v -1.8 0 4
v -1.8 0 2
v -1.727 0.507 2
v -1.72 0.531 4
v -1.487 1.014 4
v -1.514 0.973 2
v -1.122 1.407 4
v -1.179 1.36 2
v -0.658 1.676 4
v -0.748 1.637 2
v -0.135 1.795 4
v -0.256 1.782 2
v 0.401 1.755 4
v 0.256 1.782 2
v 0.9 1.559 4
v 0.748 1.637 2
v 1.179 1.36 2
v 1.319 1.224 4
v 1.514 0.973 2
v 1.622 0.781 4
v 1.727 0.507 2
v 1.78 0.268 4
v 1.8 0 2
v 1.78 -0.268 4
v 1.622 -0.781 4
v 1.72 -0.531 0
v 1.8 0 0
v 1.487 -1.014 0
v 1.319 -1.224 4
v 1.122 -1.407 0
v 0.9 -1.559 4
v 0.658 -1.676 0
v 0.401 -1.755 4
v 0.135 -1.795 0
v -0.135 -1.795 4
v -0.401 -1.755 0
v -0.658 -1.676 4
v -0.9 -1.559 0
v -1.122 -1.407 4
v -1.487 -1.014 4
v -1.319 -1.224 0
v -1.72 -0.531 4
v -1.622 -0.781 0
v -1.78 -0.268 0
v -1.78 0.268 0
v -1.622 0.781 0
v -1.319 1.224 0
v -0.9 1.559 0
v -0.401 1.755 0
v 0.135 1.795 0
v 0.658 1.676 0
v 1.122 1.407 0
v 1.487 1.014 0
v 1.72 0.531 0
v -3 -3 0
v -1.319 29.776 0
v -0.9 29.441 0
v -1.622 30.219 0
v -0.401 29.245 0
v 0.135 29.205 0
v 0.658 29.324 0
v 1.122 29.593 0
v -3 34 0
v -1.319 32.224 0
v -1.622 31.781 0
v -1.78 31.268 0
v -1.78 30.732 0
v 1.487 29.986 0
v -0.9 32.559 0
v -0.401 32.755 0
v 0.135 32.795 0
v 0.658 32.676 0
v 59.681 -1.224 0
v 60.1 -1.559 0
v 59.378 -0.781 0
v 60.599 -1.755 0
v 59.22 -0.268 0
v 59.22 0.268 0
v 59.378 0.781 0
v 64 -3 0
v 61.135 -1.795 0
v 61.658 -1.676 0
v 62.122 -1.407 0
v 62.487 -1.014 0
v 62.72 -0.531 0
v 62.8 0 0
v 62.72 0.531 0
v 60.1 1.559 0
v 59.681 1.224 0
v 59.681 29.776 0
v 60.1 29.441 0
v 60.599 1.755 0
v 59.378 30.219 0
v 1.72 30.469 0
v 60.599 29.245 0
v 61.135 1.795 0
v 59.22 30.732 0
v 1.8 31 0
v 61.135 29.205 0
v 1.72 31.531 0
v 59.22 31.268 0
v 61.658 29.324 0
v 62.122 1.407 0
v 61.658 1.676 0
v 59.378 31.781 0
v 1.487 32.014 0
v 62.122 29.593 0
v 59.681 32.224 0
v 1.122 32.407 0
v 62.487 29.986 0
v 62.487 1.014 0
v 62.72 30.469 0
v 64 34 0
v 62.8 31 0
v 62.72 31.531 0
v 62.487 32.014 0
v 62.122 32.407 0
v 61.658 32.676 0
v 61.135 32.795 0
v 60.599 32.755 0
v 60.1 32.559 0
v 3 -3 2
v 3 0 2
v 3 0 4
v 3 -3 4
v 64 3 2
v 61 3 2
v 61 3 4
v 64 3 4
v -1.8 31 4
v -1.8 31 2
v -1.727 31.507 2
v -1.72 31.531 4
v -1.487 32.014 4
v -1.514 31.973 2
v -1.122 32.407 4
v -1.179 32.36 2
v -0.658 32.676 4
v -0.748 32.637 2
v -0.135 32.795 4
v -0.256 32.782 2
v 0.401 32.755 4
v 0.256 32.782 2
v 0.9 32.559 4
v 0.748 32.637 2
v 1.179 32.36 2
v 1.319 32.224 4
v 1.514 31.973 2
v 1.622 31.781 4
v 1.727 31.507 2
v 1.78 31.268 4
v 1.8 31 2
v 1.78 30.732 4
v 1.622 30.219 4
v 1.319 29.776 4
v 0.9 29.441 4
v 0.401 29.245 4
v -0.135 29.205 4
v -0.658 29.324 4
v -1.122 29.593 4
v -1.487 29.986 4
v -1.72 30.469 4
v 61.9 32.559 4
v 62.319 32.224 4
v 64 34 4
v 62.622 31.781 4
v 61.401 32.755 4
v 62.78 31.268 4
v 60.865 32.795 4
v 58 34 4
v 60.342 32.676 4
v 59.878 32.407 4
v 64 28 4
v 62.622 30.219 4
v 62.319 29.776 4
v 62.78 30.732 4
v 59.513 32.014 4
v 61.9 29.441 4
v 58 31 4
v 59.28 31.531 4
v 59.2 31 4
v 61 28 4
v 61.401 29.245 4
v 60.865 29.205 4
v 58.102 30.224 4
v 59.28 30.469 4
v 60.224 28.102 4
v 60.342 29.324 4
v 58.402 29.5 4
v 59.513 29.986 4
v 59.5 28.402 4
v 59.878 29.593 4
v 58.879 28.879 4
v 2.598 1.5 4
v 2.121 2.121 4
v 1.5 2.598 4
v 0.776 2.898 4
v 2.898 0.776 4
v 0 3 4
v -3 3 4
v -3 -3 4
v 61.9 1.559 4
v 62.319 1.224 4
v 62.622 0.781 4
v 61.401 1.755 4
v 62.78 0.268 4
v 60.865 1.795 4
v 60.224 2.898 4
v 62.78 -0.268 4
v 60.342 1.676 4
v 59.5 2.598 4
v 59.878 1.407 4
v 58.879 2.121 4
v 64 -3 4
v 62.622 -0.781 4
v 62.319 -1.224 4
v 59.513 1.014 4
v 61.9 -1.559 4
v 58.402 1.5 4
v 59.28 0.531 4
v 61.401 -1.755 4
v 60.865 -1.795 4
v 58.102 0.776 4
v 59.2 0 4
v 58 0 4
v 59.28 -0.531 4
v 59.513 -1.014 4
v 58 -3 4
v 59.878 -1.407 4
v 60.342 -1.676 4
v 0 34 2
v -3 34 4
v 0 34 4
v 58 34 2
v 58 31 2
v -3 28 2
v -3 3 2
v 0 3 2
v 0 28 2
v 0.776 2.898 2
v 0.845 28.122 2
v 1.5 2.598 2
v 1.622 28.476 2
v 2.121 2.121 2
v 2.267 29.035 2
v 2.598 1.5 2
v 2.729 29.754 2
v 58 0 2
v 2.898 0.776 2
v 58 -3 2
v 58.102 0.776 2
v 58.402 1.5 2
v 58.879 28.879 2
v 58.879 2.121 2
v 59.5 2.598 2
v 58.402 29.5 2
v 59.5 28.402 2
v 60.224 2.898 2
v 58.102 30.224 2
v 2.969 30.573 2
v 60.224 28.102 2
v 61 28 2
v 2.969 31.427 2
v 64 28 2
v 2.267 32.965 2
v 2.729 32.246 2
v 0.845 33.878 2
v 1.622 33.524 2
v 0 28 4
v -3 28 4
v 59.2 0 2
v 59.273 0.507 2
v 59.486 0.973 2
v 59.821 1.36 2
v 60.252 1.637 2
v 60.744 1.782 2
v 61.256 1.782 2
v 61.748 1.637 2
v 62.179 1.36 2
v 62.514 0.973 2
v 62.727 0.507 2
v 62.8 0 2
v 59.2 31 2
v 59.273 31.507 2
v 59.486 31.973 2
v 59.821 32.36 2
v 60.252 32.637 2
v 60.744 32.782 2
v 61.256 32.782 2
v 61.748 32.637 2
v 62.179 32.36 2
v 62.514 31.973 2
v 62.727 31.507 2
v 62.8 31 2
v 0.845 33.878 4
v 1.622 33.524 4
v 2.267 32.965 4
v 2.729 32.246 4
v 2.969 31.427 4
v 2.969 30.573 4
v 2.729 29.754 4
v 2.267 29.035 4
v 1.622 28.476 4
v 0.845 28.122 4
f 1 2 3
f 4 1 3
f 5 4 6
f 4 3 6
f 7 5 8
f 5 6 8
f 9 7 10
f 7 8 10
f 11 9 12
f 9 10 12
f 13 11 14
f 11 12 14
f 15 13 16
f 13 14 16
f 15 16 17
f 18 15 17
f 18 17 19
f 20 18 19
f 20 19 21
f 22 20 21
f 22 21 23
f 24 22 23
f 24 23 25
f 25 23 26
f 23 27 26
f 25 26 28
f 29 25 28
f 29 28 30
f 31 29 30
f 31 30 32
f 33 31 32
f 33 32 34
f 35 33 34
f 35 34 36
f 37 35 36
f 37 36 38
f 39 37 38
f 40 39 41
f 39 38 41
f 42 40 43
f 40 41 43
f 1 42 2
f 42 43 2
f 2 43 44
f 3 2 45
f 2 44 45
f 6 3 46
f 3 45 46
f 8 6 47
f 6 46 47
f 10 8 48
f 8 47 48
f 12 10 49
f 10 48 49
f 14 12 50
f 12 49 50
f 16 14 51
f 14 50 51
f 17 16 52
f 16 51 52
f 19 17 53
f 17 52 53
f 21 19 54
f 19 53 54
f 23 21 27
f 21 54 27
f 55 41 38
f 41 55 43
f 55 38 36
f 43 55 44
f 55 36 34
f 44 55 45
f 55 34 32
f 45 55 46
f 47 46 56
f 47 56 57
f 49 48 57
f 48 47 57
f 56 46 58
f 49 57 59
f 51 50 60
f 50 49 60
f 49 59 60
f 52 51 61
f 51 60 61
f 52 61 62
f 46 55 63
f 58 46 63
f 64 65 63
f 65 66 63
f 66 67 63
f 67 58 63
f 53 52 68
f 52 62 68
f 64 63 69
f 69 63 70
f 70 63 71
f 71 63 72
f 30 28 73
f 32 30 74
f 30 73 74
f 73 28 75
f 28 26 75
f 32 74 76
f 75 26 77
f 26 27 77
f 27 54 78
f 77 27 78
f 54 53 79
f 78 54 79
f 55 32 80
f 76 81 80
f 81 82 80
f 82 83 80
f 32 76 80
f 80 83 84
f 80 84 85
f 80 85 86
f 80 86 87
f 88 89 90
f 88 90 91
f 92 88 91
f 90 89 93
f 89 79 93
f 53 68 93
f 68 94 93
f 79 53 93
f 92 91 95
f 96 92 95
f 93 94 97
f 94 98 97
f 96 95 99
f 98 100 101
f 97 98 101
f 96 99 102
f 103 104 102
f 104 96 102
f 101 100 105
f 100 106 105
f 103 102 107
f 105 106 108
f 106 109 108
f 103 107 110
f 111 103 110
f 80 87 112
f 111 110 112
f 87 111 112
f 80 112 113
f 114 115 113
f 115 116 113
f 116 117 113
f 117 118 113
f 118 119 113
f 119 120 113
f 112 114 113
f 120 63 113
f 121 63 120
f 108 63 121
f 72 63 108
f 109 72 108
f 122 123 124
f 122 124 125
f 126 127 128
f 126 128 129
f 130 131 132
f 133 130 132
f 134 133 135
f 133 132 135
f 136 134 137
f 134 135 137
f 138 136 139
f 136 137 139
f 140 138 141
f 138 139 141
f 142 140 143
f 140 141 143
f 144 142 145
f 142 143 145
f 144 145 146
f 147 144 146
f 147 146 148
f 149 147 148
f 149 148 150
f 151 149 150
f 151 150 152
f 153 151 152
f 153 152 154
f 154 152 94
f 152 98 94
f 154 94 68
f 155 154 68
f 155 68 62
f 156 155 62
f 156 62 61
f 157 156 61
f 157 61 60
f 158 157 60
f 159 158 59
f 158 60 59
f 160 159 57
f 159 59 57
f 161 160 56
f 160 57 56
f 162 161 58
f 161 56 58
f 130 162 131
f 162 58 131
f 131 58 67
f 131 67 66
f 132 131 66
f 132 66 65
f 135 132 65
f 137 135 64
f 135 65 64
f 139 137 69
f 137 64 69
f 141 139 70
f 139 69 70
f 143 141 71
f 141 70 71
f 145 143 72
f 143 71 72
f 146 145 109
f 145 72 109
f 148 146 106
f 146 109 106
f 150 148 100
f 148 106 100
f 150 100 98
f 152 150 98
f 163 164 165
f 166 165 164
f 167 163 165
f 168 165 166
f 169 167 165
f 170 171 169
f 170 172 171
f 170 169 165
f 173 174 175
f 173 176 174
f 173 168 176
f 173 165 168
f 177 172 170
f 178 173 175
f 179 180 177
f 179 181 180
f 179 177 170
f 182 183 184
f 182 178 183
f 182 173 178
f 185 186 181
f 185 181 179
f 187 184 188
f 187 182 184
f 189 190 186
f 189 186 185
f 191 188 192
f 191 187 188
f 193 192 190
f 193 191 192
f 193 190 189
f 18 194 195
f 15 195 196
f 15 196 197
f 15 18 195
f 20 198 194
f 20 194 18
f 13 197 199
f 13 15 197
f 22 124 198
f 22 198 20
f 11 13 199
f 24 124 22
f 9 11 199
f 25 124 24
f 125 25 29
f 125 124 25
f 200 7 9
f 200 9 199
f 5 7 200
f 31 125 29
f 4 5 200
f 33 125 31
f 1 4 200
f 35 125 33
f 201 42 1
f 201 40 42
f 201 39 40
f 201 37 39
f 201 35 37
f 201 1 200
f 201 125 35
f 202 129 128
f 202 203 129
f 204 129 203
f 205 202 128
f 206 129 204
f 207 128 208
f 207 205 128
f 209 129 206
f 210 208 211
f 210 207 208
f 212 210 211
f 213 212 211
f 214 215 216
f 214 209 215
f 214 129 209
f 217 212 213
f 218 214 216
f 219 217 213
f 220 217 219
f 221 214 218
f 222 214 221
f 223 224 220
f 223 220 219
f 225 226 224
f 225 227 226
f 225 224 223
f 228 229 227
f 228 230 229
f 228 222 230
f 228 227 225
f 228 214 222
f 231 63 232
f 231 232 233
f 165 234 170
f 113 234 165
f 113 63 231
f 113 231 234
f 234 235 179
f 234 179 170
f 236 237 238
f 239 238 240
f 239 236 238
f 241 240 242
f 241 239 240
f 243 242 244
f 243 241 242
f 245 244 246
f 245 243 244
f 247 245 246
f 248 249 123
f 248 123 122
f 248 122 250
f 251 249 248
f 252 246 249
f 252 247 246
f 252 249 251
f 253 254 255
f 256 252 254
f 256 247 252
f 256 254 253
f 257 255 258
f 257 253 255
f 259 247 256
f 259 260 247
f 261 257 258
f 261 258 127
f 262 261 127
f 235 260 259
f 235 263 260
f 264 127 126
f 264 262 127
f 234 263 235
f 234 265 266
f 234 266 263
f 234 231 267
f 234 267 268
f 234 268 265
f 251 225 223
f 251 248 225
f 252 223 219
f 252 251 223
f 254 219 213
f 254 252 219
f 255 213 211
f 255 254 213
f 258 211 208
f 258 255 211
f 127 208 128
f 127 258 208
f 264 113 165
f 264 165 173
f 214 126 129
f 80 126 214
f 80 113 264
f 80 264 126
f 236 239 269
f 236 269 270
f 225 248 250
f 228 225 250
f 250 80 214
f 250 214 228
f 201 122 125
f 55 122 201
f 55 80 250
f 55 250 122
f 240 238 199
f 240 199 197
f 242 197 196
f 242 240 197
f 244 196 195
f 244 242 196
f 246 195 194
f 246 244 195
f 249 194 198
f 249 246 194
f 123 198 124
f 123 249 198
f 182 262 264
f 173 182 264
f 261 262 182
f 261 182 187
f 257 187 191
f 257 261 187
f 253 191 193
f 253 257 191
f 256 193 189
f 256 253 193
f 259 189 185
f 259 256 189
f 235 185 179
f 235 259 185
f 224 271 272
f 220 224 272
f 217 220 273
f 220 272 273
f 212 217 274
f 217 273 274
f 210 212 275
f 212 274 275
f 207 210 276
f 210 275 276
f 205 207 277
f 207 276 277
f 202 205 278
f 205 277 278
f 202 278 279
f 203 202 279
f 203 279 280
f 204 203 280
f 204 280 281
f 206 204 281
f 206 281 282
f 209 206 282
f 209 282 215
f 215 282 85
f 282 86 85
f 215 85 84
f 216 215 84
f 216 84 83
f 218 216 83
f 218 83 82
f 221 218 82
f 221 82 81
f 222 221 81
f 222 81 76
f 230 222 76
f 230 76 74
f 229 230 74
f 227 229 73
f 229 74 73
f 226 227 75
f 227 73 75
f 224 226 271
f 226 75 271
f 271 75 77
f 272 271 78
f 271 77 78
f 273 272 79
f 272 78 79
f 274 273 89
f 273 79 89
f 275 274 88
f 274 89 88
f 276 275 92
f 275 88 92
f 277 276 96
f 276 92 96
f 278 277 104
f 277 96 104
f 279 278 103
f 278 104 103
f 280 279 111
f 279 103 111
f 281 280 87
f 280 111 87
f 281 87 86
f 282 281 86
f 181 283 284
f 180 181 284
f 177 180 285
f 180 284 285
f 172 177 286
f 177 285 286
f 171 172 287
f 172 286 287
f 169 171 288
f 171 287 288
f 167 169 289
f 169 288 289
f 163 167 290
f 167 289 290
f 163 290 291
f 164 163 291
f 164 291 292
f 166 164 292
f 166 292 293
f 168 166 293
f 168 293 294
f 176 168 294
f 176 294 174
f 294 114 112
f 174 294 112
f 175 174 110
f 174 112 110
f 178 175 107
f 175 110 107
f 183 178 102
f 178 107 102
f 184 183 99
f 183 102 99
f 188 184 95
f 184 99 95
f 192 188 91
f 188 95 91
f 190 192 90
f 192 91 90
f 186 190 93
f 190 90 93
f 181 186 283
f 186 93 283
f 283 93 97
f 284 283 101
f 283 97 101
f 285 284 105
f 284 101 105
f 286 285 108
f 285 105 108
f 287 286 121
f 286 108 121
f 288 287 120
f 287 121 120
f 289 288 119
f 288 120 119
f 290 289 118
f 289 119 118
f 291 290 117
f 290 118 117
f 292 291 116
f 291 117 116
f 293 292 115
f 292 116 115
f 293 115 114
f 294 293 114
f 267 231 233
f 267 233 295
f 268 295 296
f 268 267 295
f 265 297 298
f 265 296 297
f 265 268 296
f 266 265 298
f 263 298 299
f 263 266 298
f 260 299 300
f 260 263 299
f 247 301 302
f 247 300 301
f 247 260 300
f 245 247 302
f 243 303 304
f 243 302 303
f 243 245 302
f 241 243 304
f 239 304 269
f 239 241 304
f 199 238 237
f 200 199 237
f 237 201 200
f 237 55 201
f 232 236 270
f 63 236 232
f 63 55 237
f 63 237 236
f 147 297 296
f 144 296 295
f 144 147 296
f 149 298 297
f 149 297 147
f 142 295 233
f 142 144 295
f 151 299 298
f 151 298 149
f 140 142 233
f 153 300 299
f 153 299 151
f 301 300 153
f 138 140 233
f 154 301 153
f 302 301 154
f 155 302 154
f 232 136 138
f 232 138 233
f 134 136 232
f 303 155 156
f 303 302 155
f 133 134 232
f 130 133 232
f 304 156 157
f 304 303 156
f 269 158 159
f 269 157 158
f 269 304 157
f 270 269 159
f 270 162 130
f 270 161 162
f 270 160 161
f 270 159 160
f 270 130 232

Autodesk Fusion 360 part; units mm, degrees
sketch "Sketch1" plane through (0, 0, 0) normal (0, 0, 1) x (1, 0, 0)
  circle A0 centre (0, 0) radius 1.8
  circle A1 centre (61, 0) radius 1.8
  circle A2 centre (0, 31) radius 1.8
  circle A3 centre (61, 31) radius 1.8
  line L0 (-3, 34) -> (64, 34)
  line L1 (64, 34) -> (64, -3)
  line L2 (64, -3) -> (-3, -3)
  line L3 (-3, -3) -> (-3, 34)
  dimension "d3" = 61
  dimension "d4" = 31
  dimension "d5" = 3.6
  dimension "d6" = 3
  dimension "d7" = 3
  dimension "d8" = 3
  dimension "d9" = 3
extrude "Extrude1" add sketch "Sketch1" along normal blind 2
sketch "Sketch2" plane through (0, 0, 2) normal (0, 0, 1) x (-1, 0, 0)
  circle A0 centre (0, 0) radius 1.8
  circle A1 centre (-61, 0) radius 1.8
  circle A2 centre (-61, -31) radius 1.8
  circle A3 centre (0, -31) radius 1.8
  line L0 (3, 3) -> (-64, 3)
  line L1 (-64, 3) -> (-64, -34)
  line L2 (-64, -34) -> (3, -34)
  line L3 (3, -34) -> (3, 3)
  circle A4 centre (0, -31) radius 3
  line L4 (-3, -31) -> (-3, -34)
  line L5 (0, -28) -> (3, -28)
  circle A5 centre (-61, -31) radius 3
  line L6 (-61, -28) -> (-64, -28)
  line L7 (-58, -31) -> (-58, -34)
  circle A6 centre (-61, 0) radius 3
  line L8 (-58, 0) -> (-58, 3)
  line L9 (-61, -3) -> (-64, -3)
  circle A7 centre (0, 0) radius 3
  line L10 (-3, 0) -> (-3, 3)
  line L11 (0, -3) -> (3, -3)
extrude "Extrude2" add sketch "Sketch2" along normal blind 2 contours L0 A7 L10 | L0 A6 L8 | L0 L3 A7 | A7 | L0 L1 A6 | A6 | L3 A7 L11 | L1 A6 L9 | L3 A4 L5 | L1 A5 L6 | A4 | L2 L3 A4 | L1 L2 A5 | A5 | L2 A5 L7
equation "d7 = d6"
equation "d8 = d6"
equation "d9 = d6"
